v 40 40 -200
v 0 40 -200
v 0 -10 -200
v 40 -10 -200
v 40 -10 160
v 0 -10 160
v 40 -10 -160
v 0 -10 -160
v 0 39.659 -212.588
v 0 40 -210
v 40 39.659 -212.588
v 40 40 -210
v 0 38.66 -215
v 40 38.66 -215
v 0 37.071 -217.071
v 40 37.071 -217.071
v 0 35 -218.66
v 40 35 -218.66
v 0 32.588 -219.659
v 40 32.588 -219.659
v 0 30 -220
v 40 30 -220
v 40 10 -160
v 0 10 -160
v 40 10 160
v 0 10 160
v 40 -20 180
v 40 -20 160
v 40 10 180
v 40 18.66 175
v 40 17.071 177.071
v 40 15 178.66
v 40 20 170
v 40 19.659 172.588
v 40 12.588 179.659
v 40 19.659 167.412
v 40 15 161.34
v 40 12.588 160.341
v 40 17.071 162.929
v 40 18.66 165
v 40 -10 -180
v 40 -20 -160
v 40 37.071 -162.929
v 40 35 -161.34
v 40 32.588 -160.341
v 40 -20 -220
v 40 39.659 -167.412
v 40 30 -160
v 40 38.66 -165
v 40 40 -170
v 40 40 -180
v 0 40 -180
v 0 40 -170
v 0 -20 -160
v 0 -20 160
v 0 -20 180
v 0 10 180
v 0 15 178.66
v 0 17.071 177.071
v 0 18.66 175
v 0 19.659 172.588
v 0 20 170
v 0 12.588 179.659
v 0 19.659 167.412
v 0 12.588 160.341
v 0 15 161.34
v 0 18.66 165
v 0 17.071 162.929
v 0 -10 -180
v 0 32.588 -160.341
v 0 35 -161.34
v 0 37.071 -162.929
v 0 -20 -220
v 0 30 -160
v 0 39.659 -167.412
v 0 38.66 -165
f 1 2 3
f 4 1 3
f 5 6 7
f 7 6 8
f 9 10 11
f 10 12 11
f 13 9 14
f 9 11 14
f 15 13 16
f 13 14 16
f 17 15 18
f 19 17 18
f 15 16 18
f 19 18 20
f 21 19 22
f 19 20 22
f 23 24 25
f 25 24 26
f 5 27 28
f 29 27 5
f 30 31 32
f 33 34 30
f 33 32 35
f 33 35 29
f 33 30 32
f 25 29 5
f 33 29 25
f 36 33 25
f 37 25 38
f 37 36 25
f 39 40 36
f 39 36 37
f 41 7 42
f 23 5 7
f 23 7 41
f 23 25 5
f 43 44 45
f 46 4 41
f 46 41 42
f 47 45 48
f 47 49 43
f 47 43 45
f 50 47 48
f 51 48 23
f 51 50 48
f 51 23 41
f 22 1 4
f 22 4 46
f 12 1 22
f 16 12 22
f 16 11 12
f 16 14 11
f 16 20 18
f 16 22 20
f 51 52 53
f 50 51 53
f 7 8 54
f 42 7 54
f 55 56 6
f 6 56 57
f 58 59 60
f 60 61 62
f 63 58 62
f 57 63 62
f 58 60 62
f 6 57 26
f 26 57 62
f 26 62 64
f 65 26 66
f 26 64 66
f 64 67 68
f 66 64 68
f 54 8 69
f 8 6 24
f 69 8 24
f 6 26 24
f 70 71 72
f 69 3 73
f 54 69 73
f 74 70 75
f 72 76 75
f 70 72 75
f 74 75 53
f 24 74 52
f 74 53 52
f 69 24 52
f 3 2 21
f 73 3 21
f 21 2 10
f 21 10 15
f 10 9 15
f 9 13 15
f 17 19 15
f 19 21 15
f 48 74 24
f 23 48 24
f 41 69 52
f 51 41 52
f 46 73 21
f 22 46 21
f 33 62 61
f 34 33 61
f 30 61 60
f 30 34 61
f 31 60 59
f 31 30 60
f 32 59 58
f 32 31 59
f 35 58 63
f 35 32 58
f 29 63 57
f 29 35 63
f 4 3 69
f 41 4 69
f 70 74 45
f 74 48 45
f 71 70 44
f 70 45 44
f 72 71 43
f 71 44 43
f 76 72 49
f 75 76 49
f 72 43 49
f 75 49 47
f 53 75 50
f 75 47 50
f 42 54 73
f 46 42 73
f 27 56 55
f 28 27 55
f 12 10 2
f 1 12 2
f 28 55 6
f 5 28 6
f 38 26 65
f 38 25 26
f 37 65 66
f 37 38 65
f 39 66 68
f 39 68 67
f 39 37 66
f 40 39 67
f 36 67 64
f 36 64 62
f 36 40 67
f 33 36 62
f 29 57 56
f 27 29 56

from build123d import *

# Parameters (mm, degrees)
BOSS_EXTRUDE1_DEPTH = 40
FILLET1_R           = 10
FILLET2_R           = 10


with BuildPart() as part:
    # Sketch2 → Boss-Extrude1 (new body)
    with BuildSketch(Plane(origin=(0, 0, 0), x_dir=(0, 0, -1), z_dir=(1, 0, 0))):
        Polygon((-160, 10), (-160, 20), (-180, 20), (-180, -20), (-160, -20), (-160, -10), (160, -10), (160, -20), (180, -20), (220, -20), (220, 40), (200, 40), (200, -10), (180, -10), (180, 40), (160, 40), (160, 10), align=None)
    extrude(amount=BOSS_EXTRUDE1_DEPTH)

    # Fillet1
    fillet1_edges = [part.edges().sort_by_distance(p)[0] for p in [
        (20, 20, 180),
        (20, 20, 160),
    ]]
    fillet(fillet1_edges, radius=FILLET1_R - 0.0001)  # a hair under: the kernel refuses the full size

    # Fillet2
    fillet2_edges = [part.edges().sort_by_distance(p)[0] for p in [
        (20, 40, -160),
        (20, 40, -220),
    ]]
    fillet(fillet2_edges, radius=FILLET2_R)


solid = part.part
